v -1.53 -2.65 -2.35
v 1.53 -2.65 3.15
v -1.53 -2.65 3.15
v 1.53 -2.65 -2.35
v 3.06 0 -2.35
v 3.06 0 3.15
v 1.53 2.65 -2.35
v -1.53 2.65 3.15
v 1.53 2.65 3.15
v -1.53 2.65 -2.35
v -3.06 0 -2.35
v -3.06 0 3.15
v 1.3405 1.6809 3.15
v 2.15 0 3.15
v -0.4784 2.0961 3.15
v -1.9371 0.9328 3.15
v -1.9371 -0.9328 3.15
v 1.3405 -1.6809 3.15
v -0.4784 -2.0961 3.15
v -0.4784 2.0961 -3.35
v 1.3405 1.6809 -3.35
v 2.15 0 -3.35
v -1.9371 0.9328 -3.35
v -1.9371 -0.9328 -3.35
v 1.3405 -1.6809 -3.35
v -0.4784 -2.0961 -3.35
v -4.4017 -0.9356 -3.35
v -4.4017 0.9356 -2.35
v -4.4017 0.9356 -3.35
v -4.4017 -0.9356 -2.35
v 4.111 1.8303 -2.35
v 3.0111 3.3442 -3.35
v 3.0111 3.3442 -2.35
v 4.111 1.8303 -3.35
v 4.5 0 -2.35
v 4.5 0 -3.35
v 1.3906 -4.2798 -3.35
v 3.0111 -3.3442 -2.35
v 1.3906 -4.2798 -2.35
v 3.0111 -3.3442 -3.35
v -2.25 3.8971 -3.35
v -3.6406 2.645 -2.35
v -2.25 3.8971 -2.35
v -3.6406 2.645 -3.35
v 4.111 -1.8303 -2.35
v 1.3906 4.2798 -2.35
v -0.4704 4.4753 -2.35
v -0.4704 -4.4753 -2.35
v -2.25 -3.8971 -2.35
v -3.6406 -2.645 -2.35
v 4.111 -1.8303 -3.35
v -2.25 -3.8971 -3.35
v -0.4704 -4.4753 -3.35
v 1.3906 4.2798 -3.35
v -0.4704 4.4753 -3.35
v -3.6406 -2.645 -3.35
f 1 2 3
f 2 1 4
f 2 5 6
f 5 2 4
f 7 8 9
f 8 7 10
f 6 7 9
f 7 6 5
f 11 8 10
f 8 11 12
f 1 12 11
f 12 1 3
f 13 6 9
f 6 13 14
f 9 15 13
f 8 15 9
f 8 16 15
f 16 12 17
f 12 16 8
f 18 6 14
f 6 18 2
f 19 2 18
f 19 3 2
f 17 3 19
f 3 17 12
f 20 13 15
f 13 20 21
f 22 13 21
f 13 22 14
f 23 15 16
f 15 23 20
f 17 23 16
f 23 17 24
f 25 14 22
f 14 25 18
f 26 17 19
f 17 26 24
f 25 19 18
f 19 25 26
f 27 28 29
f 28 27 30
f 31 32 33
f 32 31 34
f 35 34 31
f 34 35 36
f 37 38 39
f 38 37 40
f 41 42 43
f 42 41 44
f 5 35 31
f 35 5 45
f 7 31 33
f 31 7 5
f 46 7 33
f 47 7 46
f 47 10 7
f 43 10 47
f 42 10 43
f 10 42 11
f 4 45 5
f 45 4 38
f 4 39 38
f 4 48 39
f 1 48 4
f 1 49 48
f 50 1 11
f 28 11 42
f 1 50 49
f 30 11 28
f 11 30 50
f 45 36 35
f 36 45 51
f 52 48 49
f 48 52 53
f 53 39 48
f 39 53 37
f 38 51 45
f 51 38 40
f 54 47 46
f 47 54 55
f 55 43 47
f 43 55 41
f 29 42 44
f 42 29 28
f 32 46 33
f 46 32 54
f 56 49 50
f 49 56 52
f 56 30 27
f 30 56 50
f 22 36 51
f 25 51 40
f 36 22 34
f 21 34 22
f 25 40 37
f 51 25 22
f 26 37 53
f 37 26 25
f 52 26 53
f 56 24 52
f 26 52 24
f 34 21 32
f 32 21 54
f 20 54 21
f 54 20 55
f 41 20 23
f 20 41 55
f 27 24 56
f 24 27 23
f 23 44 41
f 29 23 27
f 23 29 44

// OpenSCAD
// Parameters
thread_nominal_diameter = 4; //[2:8:0.1]
across_flats = 5.3; //[3:10.6:0.1]
thickness = 6.3; //[3.15:12.6:0.1]
bore_clearance_diameter = 4.3; //[4.1:4.8:0.05]
bore_pilot_diameter = 3.3; //[3:3.6:0.05]
bore_type_selector = 0; //[0:1:1]
chamfer_size = 0.4; //[0.2:1:0.05]
overlap = 0.8; //[0.5:2:0.1]
washer_outer_diameter = 9; //[6:18:0.1]
washer_thickness = 1; //[0.5:3:0.1]

// Hex Nut - complete geometry
module hex_nut() {
  color("DimGray") {
    difference() {
      // Hexagonal body
      cylinder(h=thickness, r=across_flats/(2*cos(30)), center=true, $fn=6);
      
      // Central bore
      cylinder(h=thickness + 2*overlap, 
               r=((1-bore_type_selector)*bore_clearance_diameter + bore_type_selector*bore_pilot_diameter)/2, 
               center=true);
      
      // Top chamfer
      translate([0, 0, thickness/2 - chamfer_size/2 + overlap/2])
        cylinder(h=chamfer_size, r1=across_flats/(2*cos(30)) + overlap, r2=0, center=true);
      
      // Bottom chamfer
      translate([0, 0, -thickness/2 + chamfer_size/2 - overlap/2])
        cylinder(h=chamfer_size, r1=across_flats/(2*cos(30)) + overlap, r2=0, center=true);
    }
  }
}

// Washer - complete geometry
module washer() {
  color("Silver") {
    difference() {
      // Outer washer
      cylinder(h=washer_thickness, r=washer_outer_diameter/2, center=true);
      
      // Washer bore
      cylinder(h=washer_thickness + 2*overlap, r=bore_clearance_diameter/2, center=true);
    }
  }
}

// Nut and Washer Assembly
module nut_and_washer() {
  hex_nut();
  translate([0, 0, -(thickness/2 + washer_thickness/2 - overlap)]) washer();
}

// Assembly
module assembly() {
  nut_and_washer();
}

assembly();
